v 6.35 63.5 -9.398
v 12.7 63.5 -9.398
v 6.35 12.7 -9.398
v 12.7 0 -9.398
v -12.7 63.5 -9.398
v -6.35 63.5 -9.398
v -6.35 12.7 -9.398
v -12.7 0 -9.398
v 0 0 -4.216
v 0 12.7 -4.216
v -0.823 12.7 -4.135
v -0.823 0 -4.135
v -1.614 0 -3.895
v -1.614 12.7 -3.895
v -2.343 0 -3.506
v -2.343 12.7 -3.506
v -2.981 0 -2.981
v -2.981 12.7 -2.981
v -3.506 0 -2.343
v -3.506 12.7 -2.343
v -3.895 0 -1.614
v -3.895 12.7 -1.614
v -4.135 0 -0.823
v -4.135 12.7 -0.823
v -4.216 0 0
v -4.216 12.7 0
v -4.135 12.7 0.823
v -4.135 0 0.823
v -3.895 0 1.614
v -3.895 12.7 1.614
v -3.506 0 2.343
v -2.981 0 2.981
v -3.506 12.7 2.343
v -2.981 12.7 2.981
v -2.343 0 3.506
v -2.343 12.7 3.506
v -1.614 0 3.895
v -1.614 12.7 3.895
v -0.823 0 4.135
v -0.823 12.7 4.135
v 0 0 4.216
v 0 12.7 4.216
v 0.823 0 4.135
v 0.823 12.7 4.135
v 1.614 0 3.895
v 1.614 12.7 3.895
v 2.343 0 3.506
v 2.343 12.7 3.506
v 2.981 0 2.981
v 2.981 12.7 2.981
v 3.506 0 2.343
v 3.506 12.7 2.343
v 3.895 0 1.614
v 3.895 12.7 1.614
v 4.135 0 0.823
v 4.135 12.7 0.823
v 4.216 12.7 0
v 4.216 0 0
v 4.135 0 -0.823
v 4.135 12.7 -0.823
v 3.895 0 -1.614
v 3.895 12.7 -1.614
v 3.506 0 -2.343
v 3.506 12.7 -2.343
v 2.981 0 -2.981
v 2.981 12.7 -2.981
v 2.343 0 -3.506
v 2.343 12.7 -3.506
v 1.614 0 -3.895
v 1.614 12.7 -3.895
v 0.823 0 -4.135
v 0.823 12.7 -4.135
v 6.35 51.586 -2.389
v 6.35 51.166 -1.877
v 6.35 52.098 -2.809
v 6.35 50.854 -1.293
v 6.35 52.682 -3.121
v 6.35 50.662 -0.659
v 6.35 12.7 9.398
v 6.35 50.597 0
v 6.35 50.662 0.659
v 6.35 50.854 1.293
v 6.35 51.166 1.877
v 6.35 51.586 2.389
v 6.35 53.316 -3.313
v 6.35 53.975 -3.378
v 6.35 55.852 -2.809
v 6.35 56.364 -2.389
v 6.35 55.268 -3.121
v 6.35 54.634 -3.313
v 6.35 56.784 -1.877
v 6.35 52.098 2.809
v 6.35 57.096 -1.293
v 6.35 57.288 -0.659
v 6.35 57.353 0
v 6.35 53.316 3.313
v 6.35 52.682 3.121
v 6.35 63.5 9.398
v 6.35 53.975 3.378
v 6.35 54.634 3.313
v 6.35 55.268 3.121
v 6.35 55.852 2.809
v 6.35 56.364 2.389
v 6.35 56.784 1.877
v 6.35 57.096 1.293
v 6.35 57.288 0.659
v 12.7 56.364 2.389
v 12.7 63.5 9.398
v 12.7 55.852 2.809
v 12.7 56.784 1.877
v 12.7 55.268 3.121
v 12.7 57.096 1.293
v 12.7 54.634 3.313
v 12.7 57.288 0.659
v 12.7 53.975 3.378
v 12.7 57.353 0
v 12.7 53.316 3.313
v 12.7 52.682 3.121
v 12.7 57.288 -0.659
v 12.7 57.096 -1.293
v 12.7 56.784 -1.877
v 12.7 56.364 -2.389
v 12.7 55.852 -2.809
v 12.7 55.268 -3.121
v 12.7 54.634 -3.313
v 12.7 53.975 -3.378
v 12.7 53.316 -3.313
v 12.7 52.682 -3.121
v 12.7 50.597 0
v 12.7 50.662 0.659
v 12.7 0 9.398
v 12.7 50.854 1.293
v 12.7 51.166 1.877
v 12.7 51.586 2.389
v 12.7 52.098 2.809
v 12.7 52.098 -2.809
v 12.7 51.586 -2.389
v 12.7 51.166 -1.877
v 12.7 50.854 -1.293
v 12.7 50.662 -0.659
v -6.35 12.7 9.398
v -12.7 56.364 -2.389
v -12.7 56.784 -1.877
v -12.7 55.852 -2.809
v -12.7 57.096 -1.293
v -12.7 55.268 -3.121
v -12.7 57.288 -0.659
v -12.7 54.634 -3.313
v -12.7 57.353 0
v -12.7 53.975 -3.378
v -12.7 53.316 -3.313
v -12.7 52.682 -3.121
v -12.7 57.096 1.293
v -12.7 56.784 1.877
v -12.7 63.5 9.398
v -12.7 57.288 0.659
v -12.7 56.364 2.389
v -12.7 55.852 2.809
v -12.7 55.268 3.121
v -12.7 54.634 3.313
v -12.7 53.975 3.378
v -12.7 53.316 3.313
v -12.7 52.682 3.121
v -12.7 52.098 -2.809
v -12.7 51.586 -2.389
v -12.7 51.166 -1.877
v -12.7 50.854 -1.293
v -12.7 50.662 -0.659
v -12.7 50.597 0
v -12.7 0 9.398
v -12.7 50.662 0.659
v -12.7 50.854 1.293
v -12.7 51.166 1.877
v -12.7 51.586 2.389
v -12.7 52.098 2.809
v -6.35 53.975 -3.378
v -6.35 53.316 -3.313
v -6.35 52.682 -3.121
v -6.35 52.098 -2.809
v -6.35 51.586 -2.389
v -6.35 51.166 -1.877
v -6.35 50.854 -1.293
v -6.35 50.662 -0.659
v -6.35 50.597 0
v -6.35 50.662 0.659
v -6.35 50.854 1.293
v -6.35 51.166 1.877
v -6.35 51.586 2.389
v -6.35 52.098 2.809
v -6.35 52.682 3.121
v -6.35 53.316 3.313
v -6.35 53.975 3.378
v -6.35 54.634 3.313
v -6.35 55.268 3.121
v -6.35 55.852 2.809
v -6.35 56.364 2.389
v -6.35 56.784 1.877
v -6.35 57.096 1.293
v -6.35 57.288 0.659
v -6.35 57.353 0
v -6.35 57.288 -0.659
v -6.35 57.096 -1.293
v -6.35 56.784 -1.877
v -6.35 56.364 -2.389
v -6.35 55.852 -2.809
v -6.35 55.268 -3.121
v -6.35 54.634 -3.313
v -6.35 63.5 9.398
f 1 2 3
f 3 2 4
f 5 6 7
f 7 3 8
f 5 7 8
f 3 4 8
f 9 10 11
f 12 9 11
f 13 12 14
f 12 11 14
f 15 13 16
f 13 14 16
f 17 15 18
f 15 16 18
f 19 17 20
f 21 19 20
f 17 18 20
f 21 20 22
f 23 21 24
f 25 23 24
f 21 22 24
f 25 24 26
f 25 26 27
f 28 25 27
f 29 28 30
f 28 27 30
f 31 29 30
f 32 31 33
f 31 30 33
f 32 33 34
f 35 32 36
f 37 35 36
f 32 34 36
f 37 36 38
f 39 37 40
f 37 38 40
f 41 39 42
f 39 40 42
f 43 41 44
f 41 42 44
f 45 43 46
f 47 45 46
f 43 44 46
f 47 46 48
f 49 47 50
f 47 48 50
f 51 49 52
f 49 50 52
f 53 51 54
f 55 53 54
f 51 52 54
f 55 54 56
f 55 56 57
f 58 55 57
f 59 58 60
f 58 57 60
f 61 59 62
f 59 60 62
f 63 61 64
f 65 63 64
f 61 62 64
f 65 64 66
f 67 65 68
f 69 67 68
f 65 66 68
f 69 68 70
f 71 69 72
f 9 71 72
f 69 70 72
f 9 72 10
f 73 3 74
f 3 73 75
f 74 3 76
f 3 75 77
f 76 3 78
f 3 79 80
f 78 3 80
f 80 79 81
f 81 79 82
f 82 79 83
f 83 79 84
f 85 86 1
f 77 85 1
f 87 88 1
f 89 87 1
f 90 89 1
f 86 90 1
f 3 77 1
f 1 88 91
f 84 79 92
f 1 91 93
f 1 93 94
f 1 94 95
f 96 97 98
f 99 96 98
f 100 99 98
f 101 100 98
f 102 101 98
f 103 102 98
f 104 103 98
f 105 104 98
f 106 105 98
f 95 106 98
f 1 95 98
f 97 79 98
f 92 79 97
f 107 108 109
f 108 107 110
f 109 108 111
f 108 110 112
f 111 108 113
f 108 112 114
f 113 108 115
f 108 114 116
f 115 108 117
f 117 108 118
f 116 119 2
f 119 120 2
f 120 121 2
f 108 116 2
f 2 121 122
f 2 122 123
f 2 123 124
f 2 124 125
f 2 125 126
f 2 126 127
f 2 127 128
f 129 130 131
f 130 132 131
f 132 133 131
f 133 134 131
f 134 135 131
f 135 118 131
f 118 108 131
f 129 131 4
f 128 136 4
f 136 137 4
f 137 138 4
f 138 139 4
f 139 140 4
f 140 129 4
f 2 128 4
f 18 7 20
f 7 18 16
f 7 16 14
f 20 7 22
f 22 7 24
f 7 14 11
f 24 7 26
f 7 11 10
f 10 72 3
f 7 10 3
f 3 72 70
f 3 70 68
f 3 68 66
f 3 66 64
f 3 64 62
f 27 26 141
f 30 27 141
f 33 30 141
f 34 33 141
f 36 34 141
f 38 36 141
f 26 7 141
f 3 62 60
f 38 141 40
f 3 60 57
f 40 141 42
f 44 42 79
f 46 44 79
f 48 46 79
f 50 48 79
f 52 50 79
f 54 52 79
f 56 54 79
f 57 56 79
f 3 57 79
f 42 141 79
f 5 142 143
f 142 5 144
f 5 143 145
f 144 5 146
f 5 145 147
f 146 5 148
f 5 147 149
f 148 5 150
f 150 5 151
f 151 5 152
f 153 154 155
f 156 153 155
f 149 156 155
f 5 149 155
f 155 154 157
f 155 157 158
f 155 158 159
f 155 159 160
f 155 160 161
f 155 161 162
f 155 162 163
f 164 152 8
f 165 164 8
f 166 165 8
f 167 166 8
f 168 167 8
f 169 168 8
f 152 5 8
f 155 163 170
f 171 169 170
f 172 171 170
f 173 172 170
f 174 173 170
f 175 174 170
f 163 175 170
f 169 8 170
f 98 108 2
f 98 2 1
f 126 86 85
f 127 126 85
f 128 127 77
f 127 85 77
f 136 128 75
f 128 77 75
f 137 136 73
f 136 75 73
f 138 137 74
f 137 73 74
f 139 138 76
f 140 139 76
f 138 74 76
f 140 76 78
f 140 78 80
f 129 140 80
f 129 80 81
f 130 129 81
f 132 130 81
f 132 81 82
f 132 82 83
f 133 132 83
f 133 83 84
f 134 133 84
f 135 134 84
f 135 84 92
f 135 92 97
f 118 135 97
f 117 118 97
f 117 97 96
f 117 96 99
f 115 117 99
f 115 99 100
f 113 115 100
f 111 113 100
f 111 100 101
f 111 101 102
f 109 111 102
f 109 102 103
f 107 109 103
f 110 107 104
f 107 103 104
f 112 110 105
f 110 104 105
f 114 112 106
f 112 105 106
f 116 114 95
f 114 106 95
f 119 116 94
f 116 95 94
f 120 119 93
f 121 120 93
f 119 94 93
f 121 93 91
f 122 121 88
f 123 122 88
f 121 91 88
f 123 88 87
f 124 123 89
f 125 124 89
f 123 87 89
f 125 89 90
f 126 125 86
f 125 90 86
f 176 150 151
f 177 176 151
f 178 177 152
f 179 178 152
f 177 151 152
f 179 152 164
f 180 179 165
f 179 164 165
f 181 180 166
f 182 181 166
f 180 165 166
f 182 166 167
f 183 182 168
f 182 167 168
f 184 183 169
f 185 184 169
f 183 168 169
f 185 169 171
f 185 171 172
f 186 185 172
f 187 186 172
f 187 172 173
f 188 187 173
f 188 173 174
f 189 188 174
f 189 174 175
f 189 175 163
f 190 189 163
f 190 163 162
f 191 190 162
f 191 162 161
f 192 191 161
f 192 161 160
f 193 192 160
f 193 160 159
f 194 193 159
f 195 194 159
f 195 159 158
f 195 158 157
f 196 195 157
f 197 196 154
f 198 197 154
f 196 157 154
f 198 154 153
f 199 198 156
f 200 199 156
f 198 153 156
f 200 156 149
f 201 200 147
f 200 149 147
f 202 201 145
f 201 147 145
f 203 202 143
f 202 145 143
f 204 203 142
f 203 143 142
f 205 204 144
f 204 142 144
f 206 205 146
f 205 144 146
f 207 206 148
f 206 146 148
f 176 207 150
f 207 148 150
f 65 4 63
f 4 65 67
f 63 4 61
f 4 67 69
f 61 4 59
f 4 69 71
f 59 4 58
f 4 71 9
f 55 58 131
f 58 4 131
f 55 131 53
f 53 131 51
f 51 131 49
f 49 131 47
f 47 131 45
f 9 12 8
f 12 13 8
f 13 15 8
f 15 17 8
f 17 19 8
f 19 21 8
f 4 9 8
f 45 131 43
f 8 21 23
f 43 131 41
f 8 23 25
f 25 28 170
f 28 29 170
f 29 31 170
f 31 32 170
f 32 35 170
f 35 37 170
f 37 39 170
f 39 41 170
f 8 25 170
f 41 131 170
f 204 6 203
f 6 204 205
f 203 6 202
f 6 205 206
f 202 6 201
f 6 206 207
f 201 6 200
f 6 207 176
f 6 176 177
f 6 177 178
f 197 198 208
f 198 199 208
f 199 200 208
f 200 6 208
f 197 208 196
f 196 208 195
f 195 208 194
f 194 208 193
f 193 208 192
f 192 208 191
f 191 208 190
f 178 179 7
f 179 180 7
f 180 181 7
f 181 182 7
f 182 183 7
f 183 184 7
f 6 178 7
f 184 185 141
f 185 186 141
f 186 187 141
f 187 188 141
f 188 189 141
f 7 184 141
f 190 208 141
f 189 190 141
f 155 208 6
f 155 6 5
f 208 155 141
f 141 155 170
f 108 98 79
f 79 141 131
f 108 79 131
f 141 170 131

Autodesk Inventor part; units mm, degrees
ref_plane "YZ Plane" through (0, 0, 0) normal (1, 0, 0) x (0, 1, 0)
ref_plane "XZ Plane" through (0, 0, 0) normal (0, 1, 0) x (-1, 0, 0)
ref_plane "XY Plane" through (0, 0, 0) normal (0, 0, 1) x (1, 0, 0)
sketch "Sketch7" plane through (0, 0, 0) normal (0, 1, 0) x (-1, 0, 0)
  line L0 (12.7, 9.398) -> (-12.7, 9.398)
  line L1 (-12.7, 9.398) -> (-12.7, -9.398)
  line L2 (-12.7, -9.398) -> (12.7, -9.398)
  line L3 (12.7, -9.398) -> (12.7, 9.398)
  line L4 (12.7, 9.398) -> (-12.7, -9.398) construction
  line L5 (-12.7, 9.398) -> (12.7, -9.398) construction
  point P0 (0, 0)
  dimension "d53" = 18.796
  dimension "d54" = 25.4
extrude "Extrusion4" add sketch "Sketch7" along normal blind 63.5
sketch "Sketch8" plane through (0, 0, 0) normal (0, -1, 0) x (1, 0, 0)
  point P0 (0, 0)
  point P1 (0, 0)
hole "Hole7" at (0, 0, 0) direction (0, 1, 0) diameter 8.4328 depth 12.7 clearance for "Flat Head Machine Screw (82)" size "5/16" standard "Ansi Unified Screw Threads"
sketch "Sketch11" plane through (-12.7, 0, 9.398) normal (0, 0, 1) x (1, 0, 0)
  line L0 (12.7, 0) -> (12.7, 63.5) construction
  line L1 (0, 63.5) -> (25.4, 63.5) construction
  line L2 (19.05, 12.7) -> (19.05, 63.5)
  line L3 (19.05, 63.5) -> (6.35, 63.5)
  line L4 (6.35, 63.5) -> (6.35, 12.7)
  line L5 (6.35, 12.7) -> (19.05, 12.7)
  line L6 (19.05, 12.7) -> (6.35, 63.5) construction
  line L7 (19.05, 63.5) -> (6.35, 12.7) construction
  line L8 (0, 0) -> (25.4, 0) projected
  point P0 (12.7, 38.1)
  dimension "d85" = 12.7
  dimension "d86" = 50.8
  dimension "d87" = 12.7
extrude "Extrusion5" cut sketch "Sketch11" against normal through all
sketch "Sketch13" plane through (12.7, 0, 9.398) normal (1, 0, 0) x (0, 0, -1)
  line L0 (18.796, 63.5) -> (0, 63.5) construction
  line L1 (9.398, 63.5) -> (9.398, 0) construction
  point P0 (9.398, 53.975)
  dimension "d97" = 9.525
hole "Hole10" at (12.7, 53.975, 0) direction (-1, 0, 0) diameter 6.7564 end through all clearance for "Flat Head Machine Screw (82)" size "1/4" standard "Ansi Unified Screw Threads"
properties part number "AngleBracketAttachementForDartActuator"
